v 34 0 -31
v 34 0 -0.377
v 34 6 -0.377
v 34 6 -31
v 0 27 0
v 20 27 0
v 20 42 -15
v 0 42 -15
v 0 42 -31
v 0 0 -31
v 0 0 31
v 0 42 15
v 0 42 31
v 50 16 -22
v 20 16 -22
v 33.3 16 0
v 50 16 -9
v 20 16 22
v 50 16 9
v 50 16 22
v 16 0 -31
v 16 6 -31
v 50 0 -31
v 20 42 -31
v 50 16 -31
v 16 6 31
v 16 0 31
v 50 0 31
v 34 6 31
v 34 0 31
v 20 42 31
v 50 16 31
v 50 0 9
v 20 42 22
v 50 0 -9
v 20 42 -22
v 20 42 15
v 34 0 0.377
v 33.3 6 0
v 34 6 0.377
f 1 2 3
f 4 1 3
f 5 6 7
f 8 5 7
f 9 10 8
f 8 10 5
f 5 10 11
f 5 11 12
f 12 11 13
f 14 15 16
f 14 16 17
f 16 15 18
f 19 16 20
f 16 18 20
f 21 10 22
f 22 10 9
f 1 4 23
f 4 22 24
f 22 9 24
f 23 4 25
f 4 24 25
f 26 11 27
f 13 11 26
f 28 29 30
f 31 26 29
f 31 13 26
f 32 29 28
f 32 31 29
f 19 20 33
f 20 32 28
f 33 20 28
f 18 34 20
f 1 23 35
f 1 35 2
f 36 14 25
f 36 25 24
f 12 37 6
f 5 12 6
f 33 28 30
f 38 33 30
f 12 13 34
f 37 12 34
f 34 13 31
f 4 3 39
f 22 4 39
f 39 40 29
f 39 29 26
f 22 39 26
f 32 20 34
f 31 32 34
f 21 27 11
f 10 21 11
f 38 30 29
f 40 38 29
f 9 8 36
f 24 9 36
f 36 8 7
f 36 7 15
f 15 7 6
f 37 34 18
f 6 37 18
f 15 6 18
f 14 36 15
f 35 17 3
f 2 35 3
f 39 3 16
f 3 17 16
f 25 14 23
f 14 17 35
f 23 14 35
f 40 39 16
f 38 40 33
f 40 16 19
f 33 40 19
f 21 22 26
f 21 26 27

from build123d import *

# Parameters (mm, degrees)
BOSS_EXTRUDE1_DEPTH = 31
BOSS_EXTRUDE3_START = 22
BOSS_EXTRUDE3_DEPTH = 9
BOSS_EXTRUDE4_START = -22
BOSS_EXTRUDE4_DEPTH = 9
CUT_EXTRUDE1_REACH  = 62.208
CUT_EXTRUDE2_REACH  = 66.32


with BuildPart() as part:
    # Sketch1 → Boss-Extrude1 (new, symmetric)
    with BuildSketch(Plane.XY):
        Polygon((0, 42), (0, 0), (16, 0), (16, 6), (34, 6), (34, 0), (50, 0), (50, 16), (20, 16), (20, 42), align=None)
    extrude(amount=BOSS_EXTRUDE1_DEPTH, both=True)

    # Sketch1<7> → Boss-Extrude3 (add)
    with BuildSketch(Plane.XY.offset(BOSS_EXTRUDE3_START)):
        Polygon((50, 16), (20, 42), (20, 16), align=None)
    extrude(amount=BOSS_EXTRUDE3_DEPTH)

    # Sketch1<8> → Boss-Extrude4 (add)
    with BuildSketch(Plane.XY.offset(BOSS_EXTRUDE4_START)):
        Polygon((50, 16), (20, 42), (20, 16), align=None)
    extrude(amount=-BOSS_EXTRUDE4_DEPTH)

    # Sketch2 → Cut-Extrude1 (cut, up to next)
    with BuildSketch(Plane(origin=(20, 0, 0), x_dir=(0, 0, -1), z_dir=(1, 0, 0)), mode=Mode.PRIVATE) as cut_extrude1_sk1:
        Polygon((-15, 42), (0, 27), (15, 42), align=None)
    cut_extrude1_tool1 = extrude(cut_extrude1_sk1.sketch, amount=-CUT_EXTRUDE1_REACH, mode=Mode.PRIVATE) & part.part
    add(cut_extrude1_tool1.solids().sort_by_distance((20, 37, 0))[0], mode=Mode.SUBTRACT)

    # Sketch3 → Cut-Extrude2 (cut, up to next)
    with BuildSketch(Plane(origin=(0, 16, 0), x_dir=(1, 0, 0), z_dir=(0, 1, 0)), mode=Mode.PRIVATE) as cut_extrude2_sk1:
        Polygon((50, 9), (33.300468379, 0), (50, -9), align=None)
    cut_extrude2_tool1 = extrude(cut_extrude2_sk1.sketch, amount=-CUT_EXTRUDE2_REACH, mode=Mode.PRIVATE) & part.part
    add(cut_extrude2_tool1.solids().sort_by_distance((44.433489, 16, 0))[0], mode=Mode.SUBTRACT)


solid = part.part
